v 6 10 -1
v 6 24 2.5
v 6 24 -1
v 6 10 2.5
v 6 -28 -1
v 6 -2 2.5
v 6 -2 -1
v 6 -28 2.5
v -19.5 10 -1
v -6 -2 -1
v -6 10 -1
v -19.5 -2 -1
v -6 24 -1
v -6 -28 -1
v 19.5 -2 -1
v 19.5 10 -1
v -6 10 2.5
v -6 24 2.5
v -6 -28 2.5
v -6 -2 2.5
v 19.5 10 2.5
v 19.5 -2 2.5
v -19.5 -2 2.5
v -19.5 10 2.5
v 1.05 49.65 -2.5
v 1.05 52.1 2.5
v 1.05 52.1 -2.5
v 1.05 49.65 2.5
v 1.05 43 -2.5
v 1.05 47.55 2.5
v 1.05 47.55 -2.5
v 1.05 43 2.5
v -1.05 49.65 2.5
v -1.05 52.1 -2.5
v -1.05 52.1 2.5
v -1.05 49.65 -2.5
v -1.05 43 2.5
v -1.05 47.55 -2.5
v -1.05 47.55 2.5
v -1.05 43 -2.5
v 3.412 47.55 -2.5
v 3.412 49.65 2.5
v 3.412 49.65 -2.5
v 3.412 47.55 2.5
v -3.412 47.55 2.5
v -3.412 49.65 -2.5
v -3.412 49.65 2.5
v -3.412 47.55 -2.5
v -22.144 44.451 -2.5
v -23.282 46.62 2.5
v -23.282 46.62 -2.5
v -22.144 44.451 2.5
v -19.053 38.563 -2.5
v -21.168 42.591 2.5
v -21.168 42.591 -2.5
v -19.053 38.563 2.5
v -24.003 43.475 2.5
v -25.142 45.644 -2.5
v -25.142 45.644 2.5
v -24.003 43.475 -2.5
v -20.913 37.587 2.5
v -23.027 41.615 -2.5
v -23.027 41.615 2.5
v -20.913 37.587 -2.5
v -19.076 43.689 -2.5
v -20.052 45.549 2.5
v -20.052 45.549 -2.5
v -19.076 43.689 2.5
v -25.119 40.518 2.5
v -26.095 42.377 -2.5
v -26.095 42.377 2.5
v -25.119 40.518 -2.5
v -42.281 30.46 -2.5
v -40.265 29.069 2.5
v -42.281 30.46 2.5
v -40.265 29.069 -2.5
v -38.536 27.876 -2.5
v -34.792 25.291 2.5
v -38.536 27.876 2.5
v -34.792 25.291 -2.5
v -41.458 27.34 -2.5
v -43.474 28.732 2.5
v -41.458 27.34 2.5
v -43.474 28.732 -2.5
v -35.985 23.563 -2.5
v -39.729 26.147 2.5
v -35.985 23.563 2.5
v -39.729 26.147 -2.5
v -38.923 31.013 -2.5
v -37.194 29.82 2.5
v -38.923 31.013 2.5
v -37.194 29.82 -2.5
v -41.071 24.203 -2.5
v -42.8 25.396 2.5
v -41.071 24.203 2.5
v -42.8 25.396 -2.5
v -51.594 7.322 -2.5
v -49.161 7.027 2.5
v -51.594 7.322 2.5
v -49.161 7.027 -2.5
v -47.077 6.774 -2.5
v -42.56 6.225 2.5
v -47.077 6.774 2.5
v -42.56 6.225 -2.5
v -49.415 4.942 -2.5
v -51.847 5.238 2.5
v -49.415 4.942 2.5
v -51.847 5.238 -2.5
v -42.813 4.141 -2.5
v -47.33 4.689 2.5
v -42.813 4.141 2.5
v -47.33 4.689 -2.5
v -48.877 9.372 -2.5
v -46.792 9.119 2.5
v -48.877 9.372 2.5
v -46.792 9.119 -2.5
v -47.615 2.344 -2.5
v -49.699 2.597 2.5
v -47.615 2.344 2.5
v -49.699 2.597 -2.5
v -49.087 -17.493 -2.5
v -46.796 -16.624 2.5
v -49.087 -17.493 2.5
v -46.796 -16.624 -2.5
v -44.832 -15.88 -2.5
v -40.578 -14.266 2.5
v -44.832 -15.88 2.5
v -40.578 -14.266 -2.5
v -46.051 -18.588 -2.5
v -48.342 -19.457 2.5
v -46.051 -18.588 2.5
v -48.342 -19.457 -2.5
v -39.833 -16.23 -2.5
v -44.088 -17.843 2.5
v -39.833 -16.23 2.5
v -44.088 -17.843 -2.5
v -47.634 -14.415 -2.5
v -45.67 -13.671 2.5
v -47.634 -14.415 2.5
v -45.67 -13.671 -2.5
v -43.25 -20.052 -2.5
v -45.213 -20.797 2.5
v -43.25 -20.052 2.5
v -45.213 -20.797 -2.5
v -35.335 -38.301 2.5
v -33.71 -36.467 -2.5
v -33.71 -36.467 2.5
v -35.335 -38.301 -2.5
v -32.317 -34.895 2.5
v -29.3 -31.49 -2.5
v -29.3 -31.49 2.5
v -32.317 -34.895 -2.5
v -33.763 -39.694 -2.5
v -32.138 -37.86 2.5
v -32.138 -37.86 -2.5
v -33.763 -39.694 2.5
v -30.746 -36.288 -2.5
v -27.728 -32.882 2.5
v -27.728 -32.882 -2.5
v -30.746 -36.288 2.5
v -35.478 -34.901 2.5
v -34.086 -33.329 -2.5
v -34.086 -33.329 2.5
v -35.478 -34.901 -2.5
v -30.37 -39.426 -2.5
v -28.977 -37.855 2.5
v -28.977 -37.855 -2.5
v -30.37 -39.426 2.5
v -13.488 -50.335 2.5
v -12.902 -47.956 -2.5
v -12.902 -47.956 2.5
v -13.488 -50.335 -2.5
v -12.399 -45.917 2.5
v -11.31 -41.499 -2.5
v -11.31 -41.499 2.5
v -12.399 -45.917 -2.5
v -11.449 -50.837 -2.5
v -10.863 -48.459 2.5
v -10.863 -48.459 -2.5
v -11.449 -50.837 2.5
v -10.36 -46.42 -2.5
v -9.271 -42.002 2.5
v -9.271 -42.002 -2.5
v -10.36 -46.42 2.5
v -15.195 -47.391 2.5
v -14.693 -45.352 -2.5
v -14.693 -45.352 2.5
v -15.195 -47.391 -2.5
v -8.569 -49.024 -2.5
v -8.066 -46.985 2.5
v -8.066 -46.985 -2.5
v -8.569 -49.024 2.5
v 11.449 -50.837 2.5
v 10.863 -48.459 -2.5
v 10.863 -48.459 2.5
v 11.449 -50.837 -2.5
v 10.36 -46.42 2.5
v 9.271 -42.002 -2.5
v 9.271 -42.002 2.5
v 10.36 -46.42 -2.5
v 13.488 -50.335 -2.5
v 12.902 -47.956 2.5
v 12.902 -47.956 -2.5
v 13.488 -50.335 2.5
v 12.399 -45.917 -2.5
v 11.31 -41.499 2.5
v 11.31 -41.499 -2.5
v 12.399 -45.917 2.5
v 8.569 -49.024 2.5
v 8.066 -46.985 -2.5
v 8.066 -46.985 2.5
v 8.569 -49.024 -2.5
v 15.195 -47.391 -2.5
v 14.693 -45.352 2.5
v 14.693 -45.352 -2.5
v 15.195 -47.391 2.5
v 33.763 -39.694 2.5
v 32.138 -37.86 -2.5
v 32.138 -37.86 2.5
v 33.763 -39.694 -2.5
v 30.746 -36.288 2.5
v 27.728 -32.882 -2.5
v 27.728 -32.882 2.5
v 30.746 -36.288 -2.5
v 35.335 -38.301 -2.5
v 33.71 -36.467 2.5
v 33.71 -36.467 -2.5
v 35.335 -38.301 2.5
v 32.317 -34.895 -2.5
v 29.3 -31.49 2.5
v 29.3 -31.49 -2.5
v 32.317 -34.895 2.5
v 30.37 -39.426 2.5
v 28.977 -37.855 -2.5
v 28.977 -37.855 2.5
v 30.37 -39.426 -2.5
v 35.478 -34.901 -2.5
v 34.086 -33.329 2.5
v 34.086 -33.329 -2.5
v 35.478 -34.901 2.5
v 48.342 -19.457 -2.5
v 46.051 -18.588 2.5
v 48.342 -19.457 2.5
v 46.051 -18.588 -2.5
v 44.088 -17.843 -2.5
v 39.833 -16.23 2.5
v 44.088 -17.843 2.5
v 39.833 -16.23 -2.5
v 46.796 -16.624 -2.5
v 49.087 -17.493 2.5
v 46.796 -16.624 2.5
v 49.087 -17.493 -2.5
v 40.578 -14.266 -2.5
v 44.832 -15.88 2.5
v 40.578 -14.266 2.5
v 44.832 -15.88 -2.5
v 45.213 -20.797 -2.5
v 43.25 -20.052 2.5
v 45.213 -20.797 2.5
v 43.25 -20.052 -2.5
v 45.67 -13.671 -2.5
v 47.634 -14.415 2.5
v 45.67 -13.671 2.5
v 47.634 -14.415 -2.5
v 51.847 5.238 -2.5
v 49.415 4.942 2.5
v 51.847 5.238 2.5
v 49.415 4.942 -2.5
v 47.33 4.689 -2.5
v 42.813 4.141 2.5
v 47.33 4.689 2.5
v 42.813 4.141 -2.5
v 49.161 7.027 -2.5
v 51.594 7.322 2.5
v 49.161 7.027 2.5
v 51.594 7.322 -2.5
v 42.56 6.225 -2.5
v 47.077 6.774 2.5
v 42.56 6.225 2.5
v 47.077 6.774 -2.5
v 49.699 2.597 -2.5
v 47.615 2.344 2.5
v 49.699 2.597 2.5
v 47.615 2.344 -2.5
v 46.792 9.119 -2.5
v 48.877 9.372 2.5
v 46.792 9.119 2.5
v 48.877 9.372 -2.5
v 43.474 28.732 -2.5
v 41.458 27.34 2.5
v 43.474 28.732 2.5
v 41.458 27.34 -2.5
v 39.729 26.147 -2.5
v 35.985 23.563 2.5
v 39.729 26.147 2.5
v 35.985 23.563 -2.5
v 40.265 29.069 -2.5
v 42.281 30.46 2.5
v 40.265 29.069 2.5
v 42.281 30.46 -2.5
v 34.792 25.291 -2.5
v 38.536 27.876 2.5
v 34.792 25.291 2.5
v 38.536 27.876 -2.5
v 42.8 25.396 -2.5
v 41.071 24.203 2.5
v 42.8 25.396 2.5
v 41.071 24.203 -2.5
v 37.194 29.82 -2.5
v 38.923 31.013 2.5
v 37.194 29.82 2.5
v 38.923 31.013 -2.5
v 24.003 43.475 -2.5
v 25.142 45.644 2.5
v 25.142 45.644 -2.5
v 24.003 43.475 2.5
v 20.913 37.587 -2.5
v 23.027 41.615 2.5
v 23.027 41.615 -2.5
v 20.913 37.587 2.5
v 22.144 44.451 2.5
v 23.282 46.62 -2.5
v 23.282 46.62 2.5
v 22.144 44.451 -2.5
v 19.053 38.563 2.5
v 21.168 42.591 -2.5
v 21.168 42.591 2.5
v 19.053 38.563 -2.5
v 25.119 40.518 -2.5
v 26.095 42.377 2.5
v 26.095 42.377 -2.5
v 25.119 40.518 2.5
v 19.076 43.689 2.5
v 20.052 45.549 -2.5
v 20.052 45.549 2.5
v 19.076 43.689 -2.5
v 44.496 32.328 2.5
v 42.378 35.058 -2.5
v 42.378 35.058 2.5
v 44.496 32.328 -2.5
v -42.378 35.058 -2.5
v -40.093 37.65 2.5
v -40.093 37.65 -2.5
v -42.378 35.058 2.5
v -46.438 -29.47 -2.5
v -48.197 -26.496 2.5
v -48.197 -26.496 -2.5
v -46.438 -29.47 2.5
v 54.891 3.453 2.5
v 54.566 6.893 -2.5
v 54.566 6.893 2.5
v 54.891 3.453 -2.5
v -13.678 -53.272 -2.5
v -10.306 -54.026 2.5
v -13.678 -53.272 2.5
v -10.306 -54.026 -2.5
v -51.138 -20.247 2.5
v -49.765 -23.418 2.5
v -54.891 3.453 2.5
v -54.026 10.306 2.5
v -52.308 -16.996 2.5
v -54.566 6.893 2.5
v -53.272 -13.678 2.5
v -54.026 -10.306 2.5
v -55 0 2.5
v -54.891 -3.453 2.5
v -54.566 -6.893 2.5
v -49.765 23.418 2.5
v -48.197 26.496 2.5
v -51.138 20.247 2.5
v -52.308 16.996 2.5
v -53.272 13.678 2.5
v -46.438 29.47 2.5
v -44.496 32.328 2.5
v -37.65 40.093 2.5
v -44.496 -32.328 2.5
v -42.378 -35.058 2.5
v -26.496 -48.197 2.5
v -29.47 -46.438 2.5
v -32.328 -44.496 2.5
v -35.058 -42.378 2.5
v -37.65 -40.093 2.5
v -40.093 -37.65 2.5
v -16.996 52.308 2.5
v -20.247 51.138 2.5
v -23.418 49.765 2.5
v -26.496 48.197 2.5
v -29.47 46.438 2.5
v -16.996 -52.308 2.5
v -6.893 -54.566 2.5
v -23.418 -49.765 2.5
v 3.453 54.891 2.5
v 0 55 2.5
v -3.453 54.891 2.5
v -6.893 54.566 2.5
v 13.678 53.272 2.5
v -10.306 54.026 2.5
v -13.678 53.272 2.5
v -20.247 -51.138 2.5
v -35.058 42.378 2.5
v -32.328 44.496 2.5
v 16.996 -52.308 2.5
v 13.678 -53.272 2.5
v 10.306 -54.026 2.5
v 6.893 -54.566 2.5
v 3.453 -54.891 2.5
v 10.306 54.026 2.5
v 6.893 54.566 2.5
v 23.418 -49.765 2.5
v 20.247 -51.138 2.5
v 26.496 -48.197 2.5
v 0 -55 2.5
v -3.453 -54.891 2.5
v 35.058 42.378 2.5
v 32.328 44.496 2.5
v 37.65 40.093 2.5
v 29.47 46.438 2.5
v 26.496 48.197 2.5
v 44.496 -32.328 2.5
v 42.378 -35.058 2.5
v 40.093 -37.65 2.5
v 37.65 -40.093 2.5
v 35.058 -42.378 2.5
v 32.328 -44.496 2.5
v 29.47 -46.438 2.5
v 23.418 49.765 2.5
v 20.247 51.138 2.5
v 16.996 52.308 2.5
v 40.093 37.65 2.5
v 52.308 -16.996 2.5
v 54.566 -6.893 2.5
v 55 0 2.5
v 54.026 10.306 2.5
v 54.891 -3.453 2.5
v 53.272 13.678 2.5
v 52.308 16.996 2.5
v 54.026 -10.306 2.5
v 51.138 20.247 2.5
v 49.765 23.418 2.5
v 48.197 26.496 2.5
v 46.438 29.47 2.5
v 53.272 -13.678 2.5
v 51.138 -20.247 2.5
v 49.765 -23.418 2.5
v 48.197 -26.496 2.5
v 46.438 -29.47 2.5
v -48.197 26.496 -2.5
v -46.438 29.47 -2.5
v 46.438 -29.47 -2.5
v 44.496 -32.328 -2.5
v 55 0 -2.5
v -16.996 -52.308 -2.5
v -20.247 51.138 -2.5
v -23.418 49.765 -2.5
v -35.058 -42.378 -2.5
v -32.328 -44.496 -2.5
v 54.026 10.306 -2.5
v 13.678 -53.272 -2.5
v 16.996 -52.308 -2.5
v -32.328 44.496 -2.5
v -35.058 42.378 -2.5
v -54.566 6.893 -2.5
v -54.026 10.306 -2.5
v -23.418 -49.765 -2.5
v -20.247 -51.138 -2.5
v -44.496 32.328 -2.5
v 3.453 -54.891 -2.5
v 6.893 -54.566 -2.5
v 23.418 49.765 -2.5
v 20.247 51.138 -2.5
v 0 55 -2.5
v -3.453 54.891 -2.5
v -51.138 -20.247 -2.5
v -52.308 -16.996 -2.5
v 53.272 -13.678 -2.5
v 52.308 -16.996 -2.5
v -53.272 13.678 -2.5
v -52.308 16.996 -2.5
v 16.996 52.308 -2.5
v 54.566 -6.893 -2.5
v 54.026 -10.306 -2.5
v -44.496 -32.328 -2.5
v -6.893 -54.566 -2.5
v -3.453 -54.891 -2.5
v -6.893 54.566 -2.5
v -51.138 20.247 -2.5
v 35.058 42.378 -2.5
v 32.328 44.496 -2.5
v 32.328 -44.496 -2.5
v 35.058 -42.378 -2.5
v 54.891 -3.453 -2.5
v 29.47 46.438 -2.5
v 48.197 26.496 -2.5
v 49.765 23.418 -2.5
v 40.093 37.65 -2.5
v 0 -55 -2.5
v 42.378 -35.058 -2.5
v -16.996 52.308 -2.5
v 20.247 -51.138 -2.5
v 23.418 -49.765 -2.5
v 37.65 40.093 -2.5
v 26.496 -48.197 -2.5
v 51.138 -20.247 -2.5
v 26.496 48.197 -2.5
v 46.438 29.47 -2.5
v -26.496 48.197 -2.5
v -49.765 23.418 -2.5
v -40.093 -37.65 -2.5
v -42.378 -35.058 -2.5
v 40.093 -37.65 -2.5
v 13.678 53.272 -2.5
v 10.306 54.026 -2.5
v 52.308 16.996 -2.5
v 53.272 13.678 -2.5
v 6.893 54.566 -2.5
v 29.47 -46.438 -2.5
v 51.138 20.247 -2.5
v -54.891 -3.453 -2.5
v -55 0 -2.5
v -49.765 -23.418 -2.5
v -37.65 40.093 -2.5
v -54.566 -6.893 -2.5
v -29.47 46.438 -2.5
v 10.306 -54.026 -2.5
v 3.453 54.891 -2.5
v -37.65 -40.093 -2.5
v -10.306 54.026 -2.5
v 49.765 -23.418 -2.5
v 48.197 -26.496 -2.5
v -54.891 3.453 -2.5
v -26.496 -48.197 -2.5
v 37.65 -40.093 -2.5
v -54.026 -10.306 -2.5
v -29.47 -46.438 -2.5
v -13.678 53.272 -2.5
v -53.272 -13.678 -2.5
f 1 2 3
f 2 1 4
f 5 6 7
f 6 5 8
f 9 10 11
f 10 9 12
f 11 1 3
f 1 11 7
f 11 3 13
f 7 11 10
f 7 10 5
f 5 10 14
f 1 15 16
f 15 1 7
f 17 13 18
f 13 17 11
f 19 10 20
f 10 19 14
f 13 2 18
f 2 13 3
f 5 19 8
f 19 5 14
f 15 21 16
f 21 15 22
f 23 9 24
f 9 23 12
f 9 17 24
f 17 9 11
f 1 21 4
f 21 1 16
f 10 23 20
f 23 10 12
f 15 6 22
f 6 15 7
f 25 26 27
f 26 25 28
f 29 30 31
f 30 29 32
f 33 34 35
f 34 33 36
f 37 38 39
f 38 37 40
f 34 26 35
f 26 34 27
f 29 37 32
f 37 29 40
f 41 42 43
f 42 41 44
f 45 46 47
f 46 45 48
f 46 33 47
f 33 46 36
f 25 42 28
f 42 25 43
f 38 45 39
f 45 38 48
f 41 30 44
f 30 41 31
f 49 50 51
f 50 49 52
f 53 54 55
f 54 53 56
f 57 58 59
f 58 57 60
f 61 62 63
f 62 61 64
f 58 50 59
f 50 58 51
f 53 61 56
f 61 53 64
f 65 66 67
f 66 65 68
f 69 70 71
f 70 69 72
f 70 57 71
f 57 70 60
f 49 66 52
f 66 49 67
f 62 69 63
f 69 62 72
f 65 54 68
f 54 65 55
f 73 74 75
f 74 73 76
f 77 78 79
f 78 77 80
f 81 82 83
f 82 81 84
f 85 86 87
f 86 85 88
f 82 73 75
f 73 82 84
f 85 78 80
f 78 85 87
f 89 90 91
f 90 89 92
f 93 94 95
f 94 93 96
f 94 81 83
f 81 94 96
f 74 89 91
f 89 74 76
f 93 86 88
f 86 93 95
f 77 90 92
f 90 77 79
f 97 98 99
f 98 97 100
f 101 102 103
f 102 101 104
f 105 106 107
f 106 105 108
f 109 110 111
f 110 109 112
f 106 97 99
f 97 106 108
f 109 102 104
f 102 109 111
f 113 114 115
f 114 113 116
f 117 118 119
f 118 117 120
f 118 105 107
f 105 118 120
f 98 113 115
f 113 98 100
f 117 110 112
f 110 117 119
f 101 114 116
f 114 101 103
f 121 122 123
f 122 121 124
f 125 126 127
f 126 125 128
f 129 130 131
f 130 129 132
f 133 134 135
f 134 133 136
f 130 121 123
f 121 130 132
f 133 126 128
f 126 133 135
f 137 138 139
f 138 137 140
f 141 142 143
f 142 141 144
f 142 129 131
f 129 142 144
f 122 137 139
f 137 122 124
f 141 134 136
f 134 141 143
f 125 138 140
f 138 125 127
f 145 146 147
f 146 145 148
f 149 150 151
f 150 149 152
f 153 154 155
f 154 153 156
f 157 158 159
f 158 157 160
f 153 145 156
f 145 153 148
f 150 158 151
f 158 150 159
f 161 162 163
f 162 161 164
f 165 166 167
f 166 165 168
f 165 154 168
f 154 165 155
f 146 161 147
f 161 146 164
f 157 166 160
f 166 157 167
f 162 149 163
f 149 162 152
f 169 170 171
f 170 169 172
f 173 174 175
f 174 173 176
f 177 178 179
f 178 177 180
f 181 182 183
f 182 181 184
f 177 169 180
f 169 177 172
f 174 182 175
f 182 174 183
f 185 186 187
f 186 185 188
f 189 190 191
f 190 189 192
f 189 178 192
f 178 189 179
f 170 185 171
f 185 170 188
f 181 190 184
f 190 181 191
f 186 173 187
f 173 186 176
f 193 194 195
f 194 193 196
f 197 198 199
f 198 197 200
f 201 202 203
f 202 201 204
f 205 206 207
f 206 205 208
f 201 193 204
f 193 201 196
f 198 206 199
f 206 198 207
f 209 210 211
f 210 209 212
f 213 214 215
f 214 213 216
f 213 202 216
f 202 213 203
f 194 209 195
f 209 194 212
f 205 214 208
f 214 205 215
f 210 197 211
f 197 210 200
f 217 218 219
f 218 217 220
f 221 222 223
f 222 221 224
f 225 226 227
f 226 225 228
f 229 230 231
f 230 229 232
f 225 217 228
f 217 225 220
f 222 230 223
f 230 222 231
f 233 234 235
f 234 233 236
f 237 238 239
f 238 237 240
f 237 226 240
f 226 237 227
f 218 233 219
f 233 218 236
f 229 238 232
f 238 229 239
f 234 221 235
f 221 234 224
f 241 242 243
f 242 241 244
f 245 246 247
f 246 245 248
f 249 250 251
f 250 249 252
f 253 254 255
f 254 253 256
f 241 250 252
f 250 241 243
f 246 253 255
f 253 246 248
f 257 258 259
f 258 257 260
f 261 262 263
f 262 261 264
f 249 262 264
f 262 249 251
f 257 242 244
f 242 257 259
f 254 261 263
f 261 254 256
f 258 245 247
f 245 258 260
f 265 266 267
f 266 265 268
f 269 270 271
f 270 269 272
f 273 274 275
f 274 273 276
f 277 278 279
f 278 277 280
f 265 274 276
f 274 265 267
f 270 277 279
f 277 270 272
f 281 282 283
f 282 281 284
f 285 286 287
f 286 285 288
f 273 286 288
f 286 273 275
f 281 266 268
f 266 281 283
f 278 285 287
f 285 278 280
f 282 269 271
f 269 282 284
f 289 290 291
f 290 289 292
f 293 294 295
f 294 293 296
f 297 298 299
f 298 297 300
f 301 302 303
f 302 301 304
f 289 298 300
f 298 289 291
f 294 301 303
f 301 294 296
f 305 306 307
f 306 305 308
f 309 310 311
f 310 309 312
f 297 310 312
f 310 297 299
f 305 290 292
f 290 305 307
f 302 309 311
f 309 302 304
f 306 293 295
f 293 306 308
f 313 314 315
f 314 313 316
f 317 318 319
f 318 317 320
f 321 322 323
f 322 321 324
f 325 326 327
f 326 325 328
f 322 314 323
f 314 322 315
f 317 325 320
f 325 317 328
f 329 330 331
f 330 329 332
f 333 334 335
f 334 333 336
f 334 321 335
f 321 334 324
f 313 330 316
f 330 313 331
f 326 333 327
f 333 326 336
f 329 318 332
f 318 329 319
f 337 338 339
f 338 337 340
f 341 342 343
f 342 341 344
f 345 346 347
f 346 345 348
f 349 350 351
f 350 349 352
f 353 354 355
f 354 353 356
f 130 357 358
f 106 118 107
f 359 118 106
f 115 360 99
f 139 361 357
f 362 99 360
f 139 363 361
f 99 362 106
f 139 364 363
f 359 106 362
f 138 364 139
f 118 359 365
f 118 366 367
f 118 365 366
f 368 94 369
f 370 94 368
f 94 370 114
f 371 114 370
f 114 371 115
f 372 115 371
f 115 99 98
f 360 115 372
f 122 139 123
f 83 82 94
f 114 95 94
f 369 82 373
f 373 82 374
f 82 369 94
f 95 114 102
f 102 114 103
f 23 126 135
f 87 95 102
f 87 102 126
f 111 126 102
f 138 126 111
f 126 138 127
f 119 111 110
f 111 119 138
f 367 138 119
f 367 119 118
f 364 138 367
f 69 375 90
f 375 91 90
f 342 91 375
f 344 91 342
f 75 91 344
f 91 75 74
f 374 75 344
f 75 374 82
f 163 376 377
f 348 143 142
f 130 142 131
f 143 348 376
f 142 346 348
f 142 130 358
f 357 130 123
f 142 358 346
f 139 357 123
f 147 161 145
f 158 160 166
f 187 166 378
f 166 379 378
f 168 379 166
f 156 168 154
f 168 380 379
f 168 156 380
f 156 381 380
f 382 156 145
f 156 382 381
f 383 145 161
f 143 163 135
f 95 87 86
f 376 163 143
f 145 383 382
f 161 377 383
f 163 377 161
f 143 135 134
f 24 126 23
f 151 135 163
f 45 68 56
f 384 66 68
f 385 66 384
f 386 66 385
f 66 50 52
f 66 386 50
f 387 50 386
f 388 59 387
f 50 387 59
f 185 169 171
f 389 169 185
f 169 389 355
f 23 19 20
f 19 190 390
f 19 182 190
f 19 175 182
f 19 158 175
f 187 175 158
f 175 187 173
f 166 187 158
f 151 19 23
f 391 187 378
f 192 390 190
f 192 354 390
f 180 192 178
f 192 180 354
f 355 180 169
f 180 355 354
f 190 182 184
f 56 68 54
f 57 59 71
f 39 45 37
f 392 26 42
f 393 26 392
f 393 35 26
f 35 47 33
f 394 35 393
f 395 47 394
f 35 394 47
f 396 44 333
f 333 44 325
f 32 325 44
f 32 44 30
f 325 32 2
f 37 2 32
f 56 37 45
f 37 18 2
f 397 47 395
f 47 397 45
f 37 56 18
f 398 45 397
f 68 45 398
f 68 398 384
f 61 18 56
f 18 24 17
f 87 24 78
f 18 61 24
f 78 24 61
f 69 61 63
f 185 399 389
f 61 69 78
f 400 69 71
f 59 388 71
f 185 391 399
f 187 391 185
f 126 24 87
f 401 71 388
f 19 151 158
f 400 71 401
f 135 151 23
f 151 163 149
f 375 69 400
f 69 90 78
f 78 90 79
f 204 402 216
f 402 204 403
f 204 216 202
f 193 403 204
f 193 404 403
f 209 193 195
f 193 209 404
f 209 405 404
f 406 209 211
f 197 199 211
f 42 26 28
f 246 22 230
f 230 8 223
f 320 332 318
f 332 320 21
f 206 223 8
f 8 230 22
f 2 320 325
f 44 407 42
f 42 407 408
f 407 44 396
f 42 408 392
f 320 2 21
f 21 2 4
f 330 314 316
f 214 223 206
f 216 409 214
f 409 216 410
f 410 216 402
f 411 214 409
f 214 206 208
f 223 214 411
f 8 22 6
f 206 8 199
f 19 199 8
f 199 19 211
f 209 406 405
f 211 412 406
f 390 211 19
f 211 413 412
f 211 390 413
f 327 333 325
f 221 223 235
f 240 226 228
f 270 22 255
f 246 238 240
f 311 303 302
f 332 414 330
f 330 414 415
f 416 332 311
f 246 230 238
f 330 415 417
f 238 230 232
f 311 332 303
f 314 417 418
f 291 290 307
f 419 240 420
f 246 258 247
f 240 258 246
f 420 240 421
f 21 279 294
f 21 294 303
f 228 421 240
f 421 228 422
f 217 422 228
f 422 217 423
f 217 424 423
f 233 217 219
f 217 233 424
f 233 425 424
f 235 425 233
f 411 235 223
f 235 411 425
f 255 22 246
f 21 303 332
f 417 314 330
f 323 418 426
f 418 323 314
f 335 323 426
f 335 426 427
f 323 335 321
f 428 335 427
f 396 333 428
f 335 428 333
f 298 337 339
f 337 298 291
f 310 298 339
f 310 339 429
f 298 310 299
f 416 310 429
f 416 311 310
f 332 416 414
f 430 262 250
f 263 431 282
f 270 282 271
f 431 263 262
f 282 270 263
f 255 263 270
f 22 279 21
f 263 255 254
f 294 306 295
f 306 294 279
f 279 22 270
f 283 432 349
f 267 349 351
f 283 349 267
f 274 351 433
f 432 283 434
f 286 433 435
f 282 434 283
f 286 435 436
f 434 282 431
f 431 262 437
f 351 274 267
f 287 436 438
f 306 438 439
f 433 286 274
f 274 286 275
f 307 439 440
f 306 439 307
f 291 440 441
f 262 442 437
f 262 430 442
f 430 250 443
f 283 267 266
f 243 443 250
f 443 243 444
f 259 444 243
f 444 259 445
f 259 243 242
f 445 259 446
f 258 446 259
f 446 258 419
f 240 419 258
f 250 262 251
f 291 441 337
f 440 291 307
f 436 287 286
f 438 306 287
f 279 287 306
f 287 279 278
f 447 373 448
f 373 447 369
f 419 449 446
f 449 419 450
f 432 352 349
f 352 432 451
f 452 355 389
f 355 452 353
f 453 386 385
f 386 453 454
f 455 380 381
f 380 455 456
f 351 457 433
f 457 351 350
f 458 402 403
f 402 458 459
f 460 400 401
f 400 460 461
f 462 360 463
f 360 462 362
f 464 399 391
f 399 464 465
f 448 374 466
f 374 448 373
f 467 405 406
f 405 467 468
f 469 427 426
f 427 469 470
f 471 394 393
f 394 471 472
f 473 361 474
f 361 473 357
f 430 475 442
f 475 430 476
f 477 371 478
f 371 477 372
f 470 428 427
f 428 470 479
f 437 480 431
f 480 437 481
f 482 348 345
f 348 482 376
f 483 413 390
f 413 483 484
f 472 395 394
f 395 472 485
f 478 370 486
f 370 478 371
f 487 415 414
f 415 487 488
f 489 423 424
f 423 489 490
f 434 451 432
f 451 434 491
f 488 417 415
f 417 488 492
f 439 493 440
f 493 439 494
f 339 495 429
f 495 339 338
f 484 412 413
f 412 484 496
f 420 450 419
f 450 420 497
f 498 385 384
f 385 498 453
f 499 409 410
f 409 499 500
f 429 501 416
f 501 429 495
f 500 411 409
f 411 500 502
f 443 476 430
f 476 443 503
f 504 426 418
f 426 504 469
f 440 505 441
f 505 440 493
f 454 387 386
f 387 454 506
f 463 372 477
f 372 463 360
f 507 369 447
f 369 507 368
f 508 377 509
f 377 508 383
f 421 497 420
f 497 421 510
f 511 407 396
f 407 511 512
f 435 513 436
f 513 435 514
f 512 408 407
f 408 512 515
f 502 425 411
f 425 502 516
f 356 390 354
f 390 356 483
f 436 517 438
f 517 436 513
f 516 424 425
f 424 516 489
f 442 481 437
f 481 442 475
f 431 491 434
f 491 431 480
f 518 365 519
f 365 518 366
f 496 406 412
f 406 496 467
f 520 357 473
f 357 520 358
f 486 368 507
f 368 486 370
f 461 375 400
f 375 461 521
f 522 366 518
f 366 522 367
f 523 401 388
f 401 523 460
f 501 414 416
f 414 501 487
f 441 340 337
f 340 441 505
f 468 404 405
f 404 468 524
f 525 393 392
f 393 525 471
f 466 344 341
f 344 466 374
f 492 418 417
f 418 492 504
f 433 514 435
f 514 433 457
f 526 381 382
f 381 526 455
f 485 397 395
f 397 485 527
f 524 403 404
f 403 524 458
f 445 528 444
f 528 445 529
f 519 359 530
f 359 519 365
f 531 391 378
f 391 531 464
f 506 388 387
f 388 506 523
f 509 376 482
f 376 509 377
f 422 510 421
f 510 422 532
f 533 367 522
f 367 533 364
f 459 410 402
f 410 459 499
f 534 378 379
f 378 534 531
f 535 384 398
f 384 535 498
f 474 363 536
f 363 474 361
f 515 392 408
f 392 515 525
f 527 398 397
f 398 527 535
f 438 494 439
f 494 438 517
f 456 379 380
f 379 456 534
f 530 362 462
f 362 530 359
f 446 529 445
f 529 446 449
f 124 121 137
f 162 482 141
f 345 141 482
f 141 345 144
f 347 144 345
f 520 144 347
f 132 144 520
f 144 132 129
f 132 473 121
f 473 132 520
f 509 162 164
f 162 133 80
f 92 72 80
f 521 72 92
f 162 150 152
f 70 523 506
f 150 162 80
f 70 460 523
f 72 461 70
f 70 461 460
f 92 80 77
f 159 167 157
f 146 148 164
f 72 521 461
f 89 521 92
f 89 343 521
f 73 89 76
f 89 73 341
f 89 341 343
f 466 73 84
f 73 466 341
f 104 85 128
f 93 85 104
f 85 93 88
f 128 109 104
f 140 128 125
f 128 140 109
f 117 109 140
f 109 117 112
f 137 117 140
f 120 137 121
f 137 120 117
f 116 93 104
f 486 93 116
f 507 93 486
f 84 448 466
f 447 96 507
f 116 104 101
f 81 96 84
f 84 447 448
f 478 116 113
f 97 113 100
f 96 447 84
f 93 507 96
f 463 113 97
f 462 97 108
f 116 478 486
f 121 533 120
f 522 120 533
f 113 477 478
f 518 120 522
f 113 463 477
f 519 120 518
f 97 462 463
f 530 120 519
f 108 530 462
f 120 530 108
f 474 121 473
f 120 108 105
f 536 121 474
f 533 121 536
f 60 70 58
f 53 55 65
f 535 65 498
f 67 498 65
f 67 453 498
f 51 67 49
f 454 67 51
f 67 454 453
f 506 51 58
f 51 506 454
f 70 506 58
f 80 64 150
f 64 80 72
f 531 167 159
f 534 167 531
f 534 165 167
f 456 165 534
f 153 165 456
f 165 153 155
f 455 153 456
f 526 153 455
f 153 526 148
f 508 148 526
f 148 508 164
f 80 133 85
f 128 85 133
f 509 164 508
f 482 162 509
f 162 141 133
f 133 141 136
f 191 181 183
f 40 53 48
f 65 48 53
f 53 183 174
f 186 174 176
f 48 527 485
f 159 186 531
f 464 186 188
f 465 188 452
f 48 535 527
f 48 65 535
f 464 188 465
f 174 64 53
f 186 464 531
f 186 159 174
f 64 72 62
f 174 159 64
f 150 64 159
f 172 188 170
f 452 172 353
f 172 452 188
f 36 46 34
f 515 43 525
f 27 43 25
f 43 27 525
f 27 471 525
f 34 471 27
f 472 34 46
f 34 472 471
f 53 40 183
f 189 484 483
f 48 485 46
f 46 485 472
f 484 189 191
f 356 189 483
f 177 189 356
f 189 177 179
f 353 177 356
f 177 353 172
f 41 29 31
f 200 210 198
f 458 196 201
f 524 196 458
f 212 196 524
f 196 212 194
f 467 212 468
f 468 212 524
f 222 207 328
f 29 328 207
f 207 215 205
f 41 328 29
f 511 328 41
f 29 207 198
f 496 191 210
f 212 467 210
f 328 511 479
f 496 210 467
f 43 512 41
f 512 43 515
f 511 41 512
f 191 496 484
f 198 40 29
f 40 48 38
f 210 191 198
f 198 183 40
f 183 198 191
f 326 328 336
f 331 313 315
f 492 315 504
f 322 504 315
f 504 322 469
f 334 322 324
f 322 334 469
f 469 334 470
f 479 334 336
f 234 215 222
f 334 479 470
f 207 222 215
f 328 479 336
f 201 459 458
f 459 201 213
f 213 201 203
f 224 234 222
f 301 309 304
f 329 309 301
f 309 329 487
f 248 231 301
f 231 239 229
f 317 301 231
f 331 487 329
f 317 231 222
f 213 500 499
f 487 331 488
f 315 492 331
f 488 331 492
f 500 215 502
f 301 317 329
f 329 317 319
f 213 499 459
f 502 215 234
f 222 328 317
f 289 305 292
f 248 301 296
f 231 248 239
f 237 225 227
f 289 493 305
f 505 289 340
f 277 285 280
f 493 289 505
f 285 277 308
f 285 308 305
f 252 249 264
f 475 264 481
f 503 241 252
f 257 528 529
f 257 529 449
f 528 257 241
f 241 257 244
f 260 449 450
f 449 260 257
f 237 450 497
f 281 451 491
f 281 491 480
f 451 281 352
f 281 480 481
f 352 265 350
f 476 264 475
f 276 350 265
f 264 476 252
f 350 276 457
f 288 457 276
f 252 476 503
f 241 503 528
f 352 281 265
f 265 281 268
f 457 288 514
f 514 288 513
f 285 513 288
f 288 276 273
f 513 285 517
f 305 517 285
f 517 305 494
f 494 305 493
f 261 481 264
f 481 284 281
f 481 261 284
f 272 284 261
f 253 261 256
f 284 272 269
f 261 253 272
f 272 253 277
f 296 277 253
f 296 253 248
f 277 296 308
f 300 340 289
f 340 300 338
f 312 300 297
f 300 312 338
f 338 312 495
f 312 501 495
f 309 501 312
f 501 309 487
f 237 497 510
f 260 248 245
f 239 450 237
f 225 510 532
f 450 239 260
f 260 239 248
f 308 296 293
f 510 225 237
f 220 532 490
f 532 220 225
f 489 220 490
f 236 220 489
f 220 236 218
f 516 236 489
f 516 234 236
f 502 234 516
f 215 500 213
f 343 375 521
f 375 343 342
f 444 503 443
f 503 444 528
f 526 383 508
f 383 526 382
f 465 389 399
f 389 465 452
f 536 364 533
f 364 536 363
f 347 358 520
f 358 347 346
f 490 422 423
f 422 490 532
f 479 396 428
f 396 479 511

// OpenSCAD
// file: ../../../../../shapes/religion/christianity/crucifixion-cross/crucifixion-cross.scad
crucifixionCcross();

module crucifixionCcross(height=2)
{
    beamWidth = 3;
    
    union()
    {
        // vertical beam
        xTranslate = -beamWidth / 2.0;
        yLength = 13;
        color("brown")
        translate([xTranslate, 0, 0])
        cube([3, yLength, height]);

        // horizontal beam        
        yTranslate = yLength * 0.5;
        xLength = yLength * 0.75;
        xTranslateHBeam = -xLength / 2.0;
        
        color("green")
        translate([xTranslateHBeam, yTranslate, 0])
        cube([xLength, 3, height]);        
    }        
}
// file: ../../../../../shapes/trees/christmas/christmas-tree.scad
christmasTree();

module christmasTree(height = 3)
{
    union()
    {
        // top triangle
        translate([0, 30, 0])
        triangle(10, height);
        
        // middle triangle
        translate([0, 15, 0])
        color("green")
        triangle(15, height);
        
        // bottom triangle
        triangle(20, height);
        
        // trunk
        color("brown")
        translate([-2.5, -15, 0])
        cube([5, 5, height]);
    }
}

module triangle(size, height)
{
    rotate([0, 0, 90])
    cylinder(r=size, 
             $fn=3,
             h=height);
}
// file: ../../../../../shapes/throwie-cutout/throwie-cutout.scad
throwieCutout();

/**
 * this modeled after a 5mm LED
 */
module throwieCutout(height=2)
{
    ledWidth = 10;
    ledHeight = 13;
    
    union()
    {
        // LED bottom cutout
        ledBottomCutoutLengthX = ledWidth + 1 + 1; 
        xTranslate = -ledBottomCutoutLengthX / 2.0;
        yLength = 13;
        color("brown")
        translate([xTranslate, 0, 0])
        cube([ledBottomCutoutLengthX, 2, height]);

        // LED middle coutout        
        yTranslate = 1.5;
        xLength = ledWidth + 1;
        xTranslateHBeam = -xLength / 2.0; 
        color("green")
        translate([xTranslateHBeam, yTranslate, 0])
        cube([xLength, 7, height]);
        
        // LED curved top
        curvedTopTranslateY = (2 + 7);
        curvedTopRadius = (ledWidth / 2.0) + 0.5;
        color("red")
        translate([0, curvedTopTranslateY, 0])
        cylinder (h = height, r=curvedTopRadius, $fn=100);
        
        // battery
        batteryRadius = 10;
        translate([0, -11, 0])
        cylinder (h = height, r=batteryRadius, $fn=100);
    }        
}
// file: ../../../../../shapes/spurs/spurs-a.scad
// Module names are of the form poly_<inkscape-path-id>().  As a result,
// you can associate a polygon in this OpenSCAD program with the corresponding
// SVG element in the Inkscape document by looking for the XML element with
// the attribute id="inkscape-path-id".

// fudge value is used to ensure that subtracted solids are a tad taller
// in the z dimension than the polygon being subtracted from.  This helps
// keep the resulting .stl file manifold.
fudge = 0.1;

module spurs(h)
{
  scale([25.4/90, -25.4/90, 1]) union()
  {
    linear_extrude(height=h)
      polygon([[13.500000,-56.000000],[29.500000,-55.000000],[54.500000,-55.000000],[58.503750,-55.048750],[60.522969,-55.341719],[62.290000,-56.020000],[64.325156,-57.853594],[66.241250,-60.541250],[69.240000,-66.000000],[80.500000,-87.000000],[106.280000,-135.000000],[118.870000,-159.000000],[122.780000,-198.000000],[124.023594,-204.882813],[125.843750,-209.652500],[128.457031,-214.095937],[132.080000,-220.000000],[148.490000,-248.000000],[153.376719,-256.487656],[155.041895,-259.143652],[156.518750,-260.956250],[158.055137,-262.086816],[159.898906,-262.696719],[165.500000,-263.000000],[214.500000,-263.000000],[214.500000,-213.000000],[213.360000,-196.000000],[213.360000,-154.000000],[213.495000,-150.462500],[213.360000,-147.000000],[196.920000,-117.000000],[156.350000,-45.000000],[125.920000,9.000000],[120.671250,18.592500],[117.385469,23.577187],[115.794199,25.366055],[114.320000,26.400000],[112.797344,26.797500],[110.981250,26.970000],[107.500000,27.000000],[79.500000,27.000000],[65.500000,28.000000],[31.500000,28.000000],[27.943750,28.030000],[24.500000,28.600000],[22.684180,29.597539],[20.548438,31.277812],[15.792500,35.922500],[7.670000,45.000000],[-36.500000,94.040000],[-25.500000,94.040000],[-15.500000,95.000000],[1.500000,95.000000],[22.500000,96.000000],[2.500000,114.080000],[-38.500000,149.000000],[-23.230000,165.000000],[-3.230000,188.000000],[14.500000,210.000000],[-66.500000,189.000000],[-91.500000,263.000000],[-92.970664,261.624141],[-94.426562,259.592500],[-97.197500,254.302500],[-101.500000,244.000000],[-121.500000,198.000000],[-200.500000,222.000000],[-174.840000,182.000000],[-154.500000,151.000000],[-187.500000,128.020000],[-214.500000,108.000000],[-166.500000,103.830000],[-135.500000,101.000000],[-137.410000,77.000000],[-139.590000,41.000000],[-140.500000,31.000000],[-138.108496,32.343340],[-135.722969,34.055469],[-131.038750,38.223750],[-122.500000,47.000000],[-111.500000,57.040000],[-94.500000,74.000000],[-77.500000,27.000000],[-107.500000,26.000000],[-117.196250,25.451250],[-122.812656,24.814531],[-126.090000,23.980000],[-127.513906,22.488438],[-128.773750,20.335000],[-130.730000,16.000000],[-138.200000,-1.000000],[-140.195000,-5.868750],[-140.649688,-8.406719],[-140.330000,-11.000000],[-134.780000,-21.000000],[-120.780000,-45.000000],[-74.650000,-124.000000],[-55.110000,-158.000000],[-46.570000,-206.000000],[-30.280000,-238.000000],[-21.920000,-254.000000],[-19.818750,-257.793750],[-18.535156,-259.646094],[-17.110000,-260.980000],[-15.251406,-261.684844],[-12.943750,-261.983750],[-8.500000,-261.990000],[5.500000,-261.000000],[19.500000,-261.000000],[31.500000,-260.040000],[43.500000,-260.040000],[43.500000,-217.000000],[44.500000,-200.000000],[44.500000,-162.000000],[43.800000,-154.000000],[28.100000,-127.000000],[-14.500000,-56.000000],[13.500000,-56.000000]]);
  }
}

spurs(5);
// file: ../../../../coin.scad
use <../shapes/spurs/spurs-a.scad>
use <../shapes/throwie-cutout/throwie-cutout.scad>
use <../shapes/trees/christmas/christmas-tree.scad>
use <../shapes/religion/christianity/crucifixion-cross/crucifixion-cross.scad>

module coin(innerIcon,
            innerIconXyScale,
            innerIconOffsetY,
            outerIcon,
            outerIconCount,            
            outerIconXyScale,
            radius,
            height)
{
    difference()
    {
        // main disk
        cylinder (h = height, r=radius, center = true, $fn=100);
        
        // inner icon
        translate([0, innerIconOffsetY, -1])
        scale([innerIconXyScale, innerIconXyScale, 6.5])
        coinIcon(innerIcon, height);
        
        // outer icons
        for ( i = [0 : outerIconCount] )
        {
            rotate( i * 360 / (outerIconCount+1), [0, 0, 1])
            translate([0, 43, -5])
            scale([outerIconXyScale, outerIconXyScale, 3.0])
            coinIcon(outerIcon, height);
        }
    }    
}

module coinIcon(iconName, height)
{
    if(iconName == "Cross")
    {
        crucifixionCcross(height);
    }
    else if(iconName == "Throwie")
    {
        throwieCutout(height=height);
    }
    else
    {
        // defalut
        christmasTree(height);
    }    
}
// main file
use <../../../../coin.scad>;

coin(innerIcon = "Cross",
     innerIconXyScale = 4,
     innerIconOffsetY = -28,
     outerIcon = "Cross",
     outerIconCount = 12,            
     outerIconXyScale = 0.7,
     radius = 55,
     height=5);
